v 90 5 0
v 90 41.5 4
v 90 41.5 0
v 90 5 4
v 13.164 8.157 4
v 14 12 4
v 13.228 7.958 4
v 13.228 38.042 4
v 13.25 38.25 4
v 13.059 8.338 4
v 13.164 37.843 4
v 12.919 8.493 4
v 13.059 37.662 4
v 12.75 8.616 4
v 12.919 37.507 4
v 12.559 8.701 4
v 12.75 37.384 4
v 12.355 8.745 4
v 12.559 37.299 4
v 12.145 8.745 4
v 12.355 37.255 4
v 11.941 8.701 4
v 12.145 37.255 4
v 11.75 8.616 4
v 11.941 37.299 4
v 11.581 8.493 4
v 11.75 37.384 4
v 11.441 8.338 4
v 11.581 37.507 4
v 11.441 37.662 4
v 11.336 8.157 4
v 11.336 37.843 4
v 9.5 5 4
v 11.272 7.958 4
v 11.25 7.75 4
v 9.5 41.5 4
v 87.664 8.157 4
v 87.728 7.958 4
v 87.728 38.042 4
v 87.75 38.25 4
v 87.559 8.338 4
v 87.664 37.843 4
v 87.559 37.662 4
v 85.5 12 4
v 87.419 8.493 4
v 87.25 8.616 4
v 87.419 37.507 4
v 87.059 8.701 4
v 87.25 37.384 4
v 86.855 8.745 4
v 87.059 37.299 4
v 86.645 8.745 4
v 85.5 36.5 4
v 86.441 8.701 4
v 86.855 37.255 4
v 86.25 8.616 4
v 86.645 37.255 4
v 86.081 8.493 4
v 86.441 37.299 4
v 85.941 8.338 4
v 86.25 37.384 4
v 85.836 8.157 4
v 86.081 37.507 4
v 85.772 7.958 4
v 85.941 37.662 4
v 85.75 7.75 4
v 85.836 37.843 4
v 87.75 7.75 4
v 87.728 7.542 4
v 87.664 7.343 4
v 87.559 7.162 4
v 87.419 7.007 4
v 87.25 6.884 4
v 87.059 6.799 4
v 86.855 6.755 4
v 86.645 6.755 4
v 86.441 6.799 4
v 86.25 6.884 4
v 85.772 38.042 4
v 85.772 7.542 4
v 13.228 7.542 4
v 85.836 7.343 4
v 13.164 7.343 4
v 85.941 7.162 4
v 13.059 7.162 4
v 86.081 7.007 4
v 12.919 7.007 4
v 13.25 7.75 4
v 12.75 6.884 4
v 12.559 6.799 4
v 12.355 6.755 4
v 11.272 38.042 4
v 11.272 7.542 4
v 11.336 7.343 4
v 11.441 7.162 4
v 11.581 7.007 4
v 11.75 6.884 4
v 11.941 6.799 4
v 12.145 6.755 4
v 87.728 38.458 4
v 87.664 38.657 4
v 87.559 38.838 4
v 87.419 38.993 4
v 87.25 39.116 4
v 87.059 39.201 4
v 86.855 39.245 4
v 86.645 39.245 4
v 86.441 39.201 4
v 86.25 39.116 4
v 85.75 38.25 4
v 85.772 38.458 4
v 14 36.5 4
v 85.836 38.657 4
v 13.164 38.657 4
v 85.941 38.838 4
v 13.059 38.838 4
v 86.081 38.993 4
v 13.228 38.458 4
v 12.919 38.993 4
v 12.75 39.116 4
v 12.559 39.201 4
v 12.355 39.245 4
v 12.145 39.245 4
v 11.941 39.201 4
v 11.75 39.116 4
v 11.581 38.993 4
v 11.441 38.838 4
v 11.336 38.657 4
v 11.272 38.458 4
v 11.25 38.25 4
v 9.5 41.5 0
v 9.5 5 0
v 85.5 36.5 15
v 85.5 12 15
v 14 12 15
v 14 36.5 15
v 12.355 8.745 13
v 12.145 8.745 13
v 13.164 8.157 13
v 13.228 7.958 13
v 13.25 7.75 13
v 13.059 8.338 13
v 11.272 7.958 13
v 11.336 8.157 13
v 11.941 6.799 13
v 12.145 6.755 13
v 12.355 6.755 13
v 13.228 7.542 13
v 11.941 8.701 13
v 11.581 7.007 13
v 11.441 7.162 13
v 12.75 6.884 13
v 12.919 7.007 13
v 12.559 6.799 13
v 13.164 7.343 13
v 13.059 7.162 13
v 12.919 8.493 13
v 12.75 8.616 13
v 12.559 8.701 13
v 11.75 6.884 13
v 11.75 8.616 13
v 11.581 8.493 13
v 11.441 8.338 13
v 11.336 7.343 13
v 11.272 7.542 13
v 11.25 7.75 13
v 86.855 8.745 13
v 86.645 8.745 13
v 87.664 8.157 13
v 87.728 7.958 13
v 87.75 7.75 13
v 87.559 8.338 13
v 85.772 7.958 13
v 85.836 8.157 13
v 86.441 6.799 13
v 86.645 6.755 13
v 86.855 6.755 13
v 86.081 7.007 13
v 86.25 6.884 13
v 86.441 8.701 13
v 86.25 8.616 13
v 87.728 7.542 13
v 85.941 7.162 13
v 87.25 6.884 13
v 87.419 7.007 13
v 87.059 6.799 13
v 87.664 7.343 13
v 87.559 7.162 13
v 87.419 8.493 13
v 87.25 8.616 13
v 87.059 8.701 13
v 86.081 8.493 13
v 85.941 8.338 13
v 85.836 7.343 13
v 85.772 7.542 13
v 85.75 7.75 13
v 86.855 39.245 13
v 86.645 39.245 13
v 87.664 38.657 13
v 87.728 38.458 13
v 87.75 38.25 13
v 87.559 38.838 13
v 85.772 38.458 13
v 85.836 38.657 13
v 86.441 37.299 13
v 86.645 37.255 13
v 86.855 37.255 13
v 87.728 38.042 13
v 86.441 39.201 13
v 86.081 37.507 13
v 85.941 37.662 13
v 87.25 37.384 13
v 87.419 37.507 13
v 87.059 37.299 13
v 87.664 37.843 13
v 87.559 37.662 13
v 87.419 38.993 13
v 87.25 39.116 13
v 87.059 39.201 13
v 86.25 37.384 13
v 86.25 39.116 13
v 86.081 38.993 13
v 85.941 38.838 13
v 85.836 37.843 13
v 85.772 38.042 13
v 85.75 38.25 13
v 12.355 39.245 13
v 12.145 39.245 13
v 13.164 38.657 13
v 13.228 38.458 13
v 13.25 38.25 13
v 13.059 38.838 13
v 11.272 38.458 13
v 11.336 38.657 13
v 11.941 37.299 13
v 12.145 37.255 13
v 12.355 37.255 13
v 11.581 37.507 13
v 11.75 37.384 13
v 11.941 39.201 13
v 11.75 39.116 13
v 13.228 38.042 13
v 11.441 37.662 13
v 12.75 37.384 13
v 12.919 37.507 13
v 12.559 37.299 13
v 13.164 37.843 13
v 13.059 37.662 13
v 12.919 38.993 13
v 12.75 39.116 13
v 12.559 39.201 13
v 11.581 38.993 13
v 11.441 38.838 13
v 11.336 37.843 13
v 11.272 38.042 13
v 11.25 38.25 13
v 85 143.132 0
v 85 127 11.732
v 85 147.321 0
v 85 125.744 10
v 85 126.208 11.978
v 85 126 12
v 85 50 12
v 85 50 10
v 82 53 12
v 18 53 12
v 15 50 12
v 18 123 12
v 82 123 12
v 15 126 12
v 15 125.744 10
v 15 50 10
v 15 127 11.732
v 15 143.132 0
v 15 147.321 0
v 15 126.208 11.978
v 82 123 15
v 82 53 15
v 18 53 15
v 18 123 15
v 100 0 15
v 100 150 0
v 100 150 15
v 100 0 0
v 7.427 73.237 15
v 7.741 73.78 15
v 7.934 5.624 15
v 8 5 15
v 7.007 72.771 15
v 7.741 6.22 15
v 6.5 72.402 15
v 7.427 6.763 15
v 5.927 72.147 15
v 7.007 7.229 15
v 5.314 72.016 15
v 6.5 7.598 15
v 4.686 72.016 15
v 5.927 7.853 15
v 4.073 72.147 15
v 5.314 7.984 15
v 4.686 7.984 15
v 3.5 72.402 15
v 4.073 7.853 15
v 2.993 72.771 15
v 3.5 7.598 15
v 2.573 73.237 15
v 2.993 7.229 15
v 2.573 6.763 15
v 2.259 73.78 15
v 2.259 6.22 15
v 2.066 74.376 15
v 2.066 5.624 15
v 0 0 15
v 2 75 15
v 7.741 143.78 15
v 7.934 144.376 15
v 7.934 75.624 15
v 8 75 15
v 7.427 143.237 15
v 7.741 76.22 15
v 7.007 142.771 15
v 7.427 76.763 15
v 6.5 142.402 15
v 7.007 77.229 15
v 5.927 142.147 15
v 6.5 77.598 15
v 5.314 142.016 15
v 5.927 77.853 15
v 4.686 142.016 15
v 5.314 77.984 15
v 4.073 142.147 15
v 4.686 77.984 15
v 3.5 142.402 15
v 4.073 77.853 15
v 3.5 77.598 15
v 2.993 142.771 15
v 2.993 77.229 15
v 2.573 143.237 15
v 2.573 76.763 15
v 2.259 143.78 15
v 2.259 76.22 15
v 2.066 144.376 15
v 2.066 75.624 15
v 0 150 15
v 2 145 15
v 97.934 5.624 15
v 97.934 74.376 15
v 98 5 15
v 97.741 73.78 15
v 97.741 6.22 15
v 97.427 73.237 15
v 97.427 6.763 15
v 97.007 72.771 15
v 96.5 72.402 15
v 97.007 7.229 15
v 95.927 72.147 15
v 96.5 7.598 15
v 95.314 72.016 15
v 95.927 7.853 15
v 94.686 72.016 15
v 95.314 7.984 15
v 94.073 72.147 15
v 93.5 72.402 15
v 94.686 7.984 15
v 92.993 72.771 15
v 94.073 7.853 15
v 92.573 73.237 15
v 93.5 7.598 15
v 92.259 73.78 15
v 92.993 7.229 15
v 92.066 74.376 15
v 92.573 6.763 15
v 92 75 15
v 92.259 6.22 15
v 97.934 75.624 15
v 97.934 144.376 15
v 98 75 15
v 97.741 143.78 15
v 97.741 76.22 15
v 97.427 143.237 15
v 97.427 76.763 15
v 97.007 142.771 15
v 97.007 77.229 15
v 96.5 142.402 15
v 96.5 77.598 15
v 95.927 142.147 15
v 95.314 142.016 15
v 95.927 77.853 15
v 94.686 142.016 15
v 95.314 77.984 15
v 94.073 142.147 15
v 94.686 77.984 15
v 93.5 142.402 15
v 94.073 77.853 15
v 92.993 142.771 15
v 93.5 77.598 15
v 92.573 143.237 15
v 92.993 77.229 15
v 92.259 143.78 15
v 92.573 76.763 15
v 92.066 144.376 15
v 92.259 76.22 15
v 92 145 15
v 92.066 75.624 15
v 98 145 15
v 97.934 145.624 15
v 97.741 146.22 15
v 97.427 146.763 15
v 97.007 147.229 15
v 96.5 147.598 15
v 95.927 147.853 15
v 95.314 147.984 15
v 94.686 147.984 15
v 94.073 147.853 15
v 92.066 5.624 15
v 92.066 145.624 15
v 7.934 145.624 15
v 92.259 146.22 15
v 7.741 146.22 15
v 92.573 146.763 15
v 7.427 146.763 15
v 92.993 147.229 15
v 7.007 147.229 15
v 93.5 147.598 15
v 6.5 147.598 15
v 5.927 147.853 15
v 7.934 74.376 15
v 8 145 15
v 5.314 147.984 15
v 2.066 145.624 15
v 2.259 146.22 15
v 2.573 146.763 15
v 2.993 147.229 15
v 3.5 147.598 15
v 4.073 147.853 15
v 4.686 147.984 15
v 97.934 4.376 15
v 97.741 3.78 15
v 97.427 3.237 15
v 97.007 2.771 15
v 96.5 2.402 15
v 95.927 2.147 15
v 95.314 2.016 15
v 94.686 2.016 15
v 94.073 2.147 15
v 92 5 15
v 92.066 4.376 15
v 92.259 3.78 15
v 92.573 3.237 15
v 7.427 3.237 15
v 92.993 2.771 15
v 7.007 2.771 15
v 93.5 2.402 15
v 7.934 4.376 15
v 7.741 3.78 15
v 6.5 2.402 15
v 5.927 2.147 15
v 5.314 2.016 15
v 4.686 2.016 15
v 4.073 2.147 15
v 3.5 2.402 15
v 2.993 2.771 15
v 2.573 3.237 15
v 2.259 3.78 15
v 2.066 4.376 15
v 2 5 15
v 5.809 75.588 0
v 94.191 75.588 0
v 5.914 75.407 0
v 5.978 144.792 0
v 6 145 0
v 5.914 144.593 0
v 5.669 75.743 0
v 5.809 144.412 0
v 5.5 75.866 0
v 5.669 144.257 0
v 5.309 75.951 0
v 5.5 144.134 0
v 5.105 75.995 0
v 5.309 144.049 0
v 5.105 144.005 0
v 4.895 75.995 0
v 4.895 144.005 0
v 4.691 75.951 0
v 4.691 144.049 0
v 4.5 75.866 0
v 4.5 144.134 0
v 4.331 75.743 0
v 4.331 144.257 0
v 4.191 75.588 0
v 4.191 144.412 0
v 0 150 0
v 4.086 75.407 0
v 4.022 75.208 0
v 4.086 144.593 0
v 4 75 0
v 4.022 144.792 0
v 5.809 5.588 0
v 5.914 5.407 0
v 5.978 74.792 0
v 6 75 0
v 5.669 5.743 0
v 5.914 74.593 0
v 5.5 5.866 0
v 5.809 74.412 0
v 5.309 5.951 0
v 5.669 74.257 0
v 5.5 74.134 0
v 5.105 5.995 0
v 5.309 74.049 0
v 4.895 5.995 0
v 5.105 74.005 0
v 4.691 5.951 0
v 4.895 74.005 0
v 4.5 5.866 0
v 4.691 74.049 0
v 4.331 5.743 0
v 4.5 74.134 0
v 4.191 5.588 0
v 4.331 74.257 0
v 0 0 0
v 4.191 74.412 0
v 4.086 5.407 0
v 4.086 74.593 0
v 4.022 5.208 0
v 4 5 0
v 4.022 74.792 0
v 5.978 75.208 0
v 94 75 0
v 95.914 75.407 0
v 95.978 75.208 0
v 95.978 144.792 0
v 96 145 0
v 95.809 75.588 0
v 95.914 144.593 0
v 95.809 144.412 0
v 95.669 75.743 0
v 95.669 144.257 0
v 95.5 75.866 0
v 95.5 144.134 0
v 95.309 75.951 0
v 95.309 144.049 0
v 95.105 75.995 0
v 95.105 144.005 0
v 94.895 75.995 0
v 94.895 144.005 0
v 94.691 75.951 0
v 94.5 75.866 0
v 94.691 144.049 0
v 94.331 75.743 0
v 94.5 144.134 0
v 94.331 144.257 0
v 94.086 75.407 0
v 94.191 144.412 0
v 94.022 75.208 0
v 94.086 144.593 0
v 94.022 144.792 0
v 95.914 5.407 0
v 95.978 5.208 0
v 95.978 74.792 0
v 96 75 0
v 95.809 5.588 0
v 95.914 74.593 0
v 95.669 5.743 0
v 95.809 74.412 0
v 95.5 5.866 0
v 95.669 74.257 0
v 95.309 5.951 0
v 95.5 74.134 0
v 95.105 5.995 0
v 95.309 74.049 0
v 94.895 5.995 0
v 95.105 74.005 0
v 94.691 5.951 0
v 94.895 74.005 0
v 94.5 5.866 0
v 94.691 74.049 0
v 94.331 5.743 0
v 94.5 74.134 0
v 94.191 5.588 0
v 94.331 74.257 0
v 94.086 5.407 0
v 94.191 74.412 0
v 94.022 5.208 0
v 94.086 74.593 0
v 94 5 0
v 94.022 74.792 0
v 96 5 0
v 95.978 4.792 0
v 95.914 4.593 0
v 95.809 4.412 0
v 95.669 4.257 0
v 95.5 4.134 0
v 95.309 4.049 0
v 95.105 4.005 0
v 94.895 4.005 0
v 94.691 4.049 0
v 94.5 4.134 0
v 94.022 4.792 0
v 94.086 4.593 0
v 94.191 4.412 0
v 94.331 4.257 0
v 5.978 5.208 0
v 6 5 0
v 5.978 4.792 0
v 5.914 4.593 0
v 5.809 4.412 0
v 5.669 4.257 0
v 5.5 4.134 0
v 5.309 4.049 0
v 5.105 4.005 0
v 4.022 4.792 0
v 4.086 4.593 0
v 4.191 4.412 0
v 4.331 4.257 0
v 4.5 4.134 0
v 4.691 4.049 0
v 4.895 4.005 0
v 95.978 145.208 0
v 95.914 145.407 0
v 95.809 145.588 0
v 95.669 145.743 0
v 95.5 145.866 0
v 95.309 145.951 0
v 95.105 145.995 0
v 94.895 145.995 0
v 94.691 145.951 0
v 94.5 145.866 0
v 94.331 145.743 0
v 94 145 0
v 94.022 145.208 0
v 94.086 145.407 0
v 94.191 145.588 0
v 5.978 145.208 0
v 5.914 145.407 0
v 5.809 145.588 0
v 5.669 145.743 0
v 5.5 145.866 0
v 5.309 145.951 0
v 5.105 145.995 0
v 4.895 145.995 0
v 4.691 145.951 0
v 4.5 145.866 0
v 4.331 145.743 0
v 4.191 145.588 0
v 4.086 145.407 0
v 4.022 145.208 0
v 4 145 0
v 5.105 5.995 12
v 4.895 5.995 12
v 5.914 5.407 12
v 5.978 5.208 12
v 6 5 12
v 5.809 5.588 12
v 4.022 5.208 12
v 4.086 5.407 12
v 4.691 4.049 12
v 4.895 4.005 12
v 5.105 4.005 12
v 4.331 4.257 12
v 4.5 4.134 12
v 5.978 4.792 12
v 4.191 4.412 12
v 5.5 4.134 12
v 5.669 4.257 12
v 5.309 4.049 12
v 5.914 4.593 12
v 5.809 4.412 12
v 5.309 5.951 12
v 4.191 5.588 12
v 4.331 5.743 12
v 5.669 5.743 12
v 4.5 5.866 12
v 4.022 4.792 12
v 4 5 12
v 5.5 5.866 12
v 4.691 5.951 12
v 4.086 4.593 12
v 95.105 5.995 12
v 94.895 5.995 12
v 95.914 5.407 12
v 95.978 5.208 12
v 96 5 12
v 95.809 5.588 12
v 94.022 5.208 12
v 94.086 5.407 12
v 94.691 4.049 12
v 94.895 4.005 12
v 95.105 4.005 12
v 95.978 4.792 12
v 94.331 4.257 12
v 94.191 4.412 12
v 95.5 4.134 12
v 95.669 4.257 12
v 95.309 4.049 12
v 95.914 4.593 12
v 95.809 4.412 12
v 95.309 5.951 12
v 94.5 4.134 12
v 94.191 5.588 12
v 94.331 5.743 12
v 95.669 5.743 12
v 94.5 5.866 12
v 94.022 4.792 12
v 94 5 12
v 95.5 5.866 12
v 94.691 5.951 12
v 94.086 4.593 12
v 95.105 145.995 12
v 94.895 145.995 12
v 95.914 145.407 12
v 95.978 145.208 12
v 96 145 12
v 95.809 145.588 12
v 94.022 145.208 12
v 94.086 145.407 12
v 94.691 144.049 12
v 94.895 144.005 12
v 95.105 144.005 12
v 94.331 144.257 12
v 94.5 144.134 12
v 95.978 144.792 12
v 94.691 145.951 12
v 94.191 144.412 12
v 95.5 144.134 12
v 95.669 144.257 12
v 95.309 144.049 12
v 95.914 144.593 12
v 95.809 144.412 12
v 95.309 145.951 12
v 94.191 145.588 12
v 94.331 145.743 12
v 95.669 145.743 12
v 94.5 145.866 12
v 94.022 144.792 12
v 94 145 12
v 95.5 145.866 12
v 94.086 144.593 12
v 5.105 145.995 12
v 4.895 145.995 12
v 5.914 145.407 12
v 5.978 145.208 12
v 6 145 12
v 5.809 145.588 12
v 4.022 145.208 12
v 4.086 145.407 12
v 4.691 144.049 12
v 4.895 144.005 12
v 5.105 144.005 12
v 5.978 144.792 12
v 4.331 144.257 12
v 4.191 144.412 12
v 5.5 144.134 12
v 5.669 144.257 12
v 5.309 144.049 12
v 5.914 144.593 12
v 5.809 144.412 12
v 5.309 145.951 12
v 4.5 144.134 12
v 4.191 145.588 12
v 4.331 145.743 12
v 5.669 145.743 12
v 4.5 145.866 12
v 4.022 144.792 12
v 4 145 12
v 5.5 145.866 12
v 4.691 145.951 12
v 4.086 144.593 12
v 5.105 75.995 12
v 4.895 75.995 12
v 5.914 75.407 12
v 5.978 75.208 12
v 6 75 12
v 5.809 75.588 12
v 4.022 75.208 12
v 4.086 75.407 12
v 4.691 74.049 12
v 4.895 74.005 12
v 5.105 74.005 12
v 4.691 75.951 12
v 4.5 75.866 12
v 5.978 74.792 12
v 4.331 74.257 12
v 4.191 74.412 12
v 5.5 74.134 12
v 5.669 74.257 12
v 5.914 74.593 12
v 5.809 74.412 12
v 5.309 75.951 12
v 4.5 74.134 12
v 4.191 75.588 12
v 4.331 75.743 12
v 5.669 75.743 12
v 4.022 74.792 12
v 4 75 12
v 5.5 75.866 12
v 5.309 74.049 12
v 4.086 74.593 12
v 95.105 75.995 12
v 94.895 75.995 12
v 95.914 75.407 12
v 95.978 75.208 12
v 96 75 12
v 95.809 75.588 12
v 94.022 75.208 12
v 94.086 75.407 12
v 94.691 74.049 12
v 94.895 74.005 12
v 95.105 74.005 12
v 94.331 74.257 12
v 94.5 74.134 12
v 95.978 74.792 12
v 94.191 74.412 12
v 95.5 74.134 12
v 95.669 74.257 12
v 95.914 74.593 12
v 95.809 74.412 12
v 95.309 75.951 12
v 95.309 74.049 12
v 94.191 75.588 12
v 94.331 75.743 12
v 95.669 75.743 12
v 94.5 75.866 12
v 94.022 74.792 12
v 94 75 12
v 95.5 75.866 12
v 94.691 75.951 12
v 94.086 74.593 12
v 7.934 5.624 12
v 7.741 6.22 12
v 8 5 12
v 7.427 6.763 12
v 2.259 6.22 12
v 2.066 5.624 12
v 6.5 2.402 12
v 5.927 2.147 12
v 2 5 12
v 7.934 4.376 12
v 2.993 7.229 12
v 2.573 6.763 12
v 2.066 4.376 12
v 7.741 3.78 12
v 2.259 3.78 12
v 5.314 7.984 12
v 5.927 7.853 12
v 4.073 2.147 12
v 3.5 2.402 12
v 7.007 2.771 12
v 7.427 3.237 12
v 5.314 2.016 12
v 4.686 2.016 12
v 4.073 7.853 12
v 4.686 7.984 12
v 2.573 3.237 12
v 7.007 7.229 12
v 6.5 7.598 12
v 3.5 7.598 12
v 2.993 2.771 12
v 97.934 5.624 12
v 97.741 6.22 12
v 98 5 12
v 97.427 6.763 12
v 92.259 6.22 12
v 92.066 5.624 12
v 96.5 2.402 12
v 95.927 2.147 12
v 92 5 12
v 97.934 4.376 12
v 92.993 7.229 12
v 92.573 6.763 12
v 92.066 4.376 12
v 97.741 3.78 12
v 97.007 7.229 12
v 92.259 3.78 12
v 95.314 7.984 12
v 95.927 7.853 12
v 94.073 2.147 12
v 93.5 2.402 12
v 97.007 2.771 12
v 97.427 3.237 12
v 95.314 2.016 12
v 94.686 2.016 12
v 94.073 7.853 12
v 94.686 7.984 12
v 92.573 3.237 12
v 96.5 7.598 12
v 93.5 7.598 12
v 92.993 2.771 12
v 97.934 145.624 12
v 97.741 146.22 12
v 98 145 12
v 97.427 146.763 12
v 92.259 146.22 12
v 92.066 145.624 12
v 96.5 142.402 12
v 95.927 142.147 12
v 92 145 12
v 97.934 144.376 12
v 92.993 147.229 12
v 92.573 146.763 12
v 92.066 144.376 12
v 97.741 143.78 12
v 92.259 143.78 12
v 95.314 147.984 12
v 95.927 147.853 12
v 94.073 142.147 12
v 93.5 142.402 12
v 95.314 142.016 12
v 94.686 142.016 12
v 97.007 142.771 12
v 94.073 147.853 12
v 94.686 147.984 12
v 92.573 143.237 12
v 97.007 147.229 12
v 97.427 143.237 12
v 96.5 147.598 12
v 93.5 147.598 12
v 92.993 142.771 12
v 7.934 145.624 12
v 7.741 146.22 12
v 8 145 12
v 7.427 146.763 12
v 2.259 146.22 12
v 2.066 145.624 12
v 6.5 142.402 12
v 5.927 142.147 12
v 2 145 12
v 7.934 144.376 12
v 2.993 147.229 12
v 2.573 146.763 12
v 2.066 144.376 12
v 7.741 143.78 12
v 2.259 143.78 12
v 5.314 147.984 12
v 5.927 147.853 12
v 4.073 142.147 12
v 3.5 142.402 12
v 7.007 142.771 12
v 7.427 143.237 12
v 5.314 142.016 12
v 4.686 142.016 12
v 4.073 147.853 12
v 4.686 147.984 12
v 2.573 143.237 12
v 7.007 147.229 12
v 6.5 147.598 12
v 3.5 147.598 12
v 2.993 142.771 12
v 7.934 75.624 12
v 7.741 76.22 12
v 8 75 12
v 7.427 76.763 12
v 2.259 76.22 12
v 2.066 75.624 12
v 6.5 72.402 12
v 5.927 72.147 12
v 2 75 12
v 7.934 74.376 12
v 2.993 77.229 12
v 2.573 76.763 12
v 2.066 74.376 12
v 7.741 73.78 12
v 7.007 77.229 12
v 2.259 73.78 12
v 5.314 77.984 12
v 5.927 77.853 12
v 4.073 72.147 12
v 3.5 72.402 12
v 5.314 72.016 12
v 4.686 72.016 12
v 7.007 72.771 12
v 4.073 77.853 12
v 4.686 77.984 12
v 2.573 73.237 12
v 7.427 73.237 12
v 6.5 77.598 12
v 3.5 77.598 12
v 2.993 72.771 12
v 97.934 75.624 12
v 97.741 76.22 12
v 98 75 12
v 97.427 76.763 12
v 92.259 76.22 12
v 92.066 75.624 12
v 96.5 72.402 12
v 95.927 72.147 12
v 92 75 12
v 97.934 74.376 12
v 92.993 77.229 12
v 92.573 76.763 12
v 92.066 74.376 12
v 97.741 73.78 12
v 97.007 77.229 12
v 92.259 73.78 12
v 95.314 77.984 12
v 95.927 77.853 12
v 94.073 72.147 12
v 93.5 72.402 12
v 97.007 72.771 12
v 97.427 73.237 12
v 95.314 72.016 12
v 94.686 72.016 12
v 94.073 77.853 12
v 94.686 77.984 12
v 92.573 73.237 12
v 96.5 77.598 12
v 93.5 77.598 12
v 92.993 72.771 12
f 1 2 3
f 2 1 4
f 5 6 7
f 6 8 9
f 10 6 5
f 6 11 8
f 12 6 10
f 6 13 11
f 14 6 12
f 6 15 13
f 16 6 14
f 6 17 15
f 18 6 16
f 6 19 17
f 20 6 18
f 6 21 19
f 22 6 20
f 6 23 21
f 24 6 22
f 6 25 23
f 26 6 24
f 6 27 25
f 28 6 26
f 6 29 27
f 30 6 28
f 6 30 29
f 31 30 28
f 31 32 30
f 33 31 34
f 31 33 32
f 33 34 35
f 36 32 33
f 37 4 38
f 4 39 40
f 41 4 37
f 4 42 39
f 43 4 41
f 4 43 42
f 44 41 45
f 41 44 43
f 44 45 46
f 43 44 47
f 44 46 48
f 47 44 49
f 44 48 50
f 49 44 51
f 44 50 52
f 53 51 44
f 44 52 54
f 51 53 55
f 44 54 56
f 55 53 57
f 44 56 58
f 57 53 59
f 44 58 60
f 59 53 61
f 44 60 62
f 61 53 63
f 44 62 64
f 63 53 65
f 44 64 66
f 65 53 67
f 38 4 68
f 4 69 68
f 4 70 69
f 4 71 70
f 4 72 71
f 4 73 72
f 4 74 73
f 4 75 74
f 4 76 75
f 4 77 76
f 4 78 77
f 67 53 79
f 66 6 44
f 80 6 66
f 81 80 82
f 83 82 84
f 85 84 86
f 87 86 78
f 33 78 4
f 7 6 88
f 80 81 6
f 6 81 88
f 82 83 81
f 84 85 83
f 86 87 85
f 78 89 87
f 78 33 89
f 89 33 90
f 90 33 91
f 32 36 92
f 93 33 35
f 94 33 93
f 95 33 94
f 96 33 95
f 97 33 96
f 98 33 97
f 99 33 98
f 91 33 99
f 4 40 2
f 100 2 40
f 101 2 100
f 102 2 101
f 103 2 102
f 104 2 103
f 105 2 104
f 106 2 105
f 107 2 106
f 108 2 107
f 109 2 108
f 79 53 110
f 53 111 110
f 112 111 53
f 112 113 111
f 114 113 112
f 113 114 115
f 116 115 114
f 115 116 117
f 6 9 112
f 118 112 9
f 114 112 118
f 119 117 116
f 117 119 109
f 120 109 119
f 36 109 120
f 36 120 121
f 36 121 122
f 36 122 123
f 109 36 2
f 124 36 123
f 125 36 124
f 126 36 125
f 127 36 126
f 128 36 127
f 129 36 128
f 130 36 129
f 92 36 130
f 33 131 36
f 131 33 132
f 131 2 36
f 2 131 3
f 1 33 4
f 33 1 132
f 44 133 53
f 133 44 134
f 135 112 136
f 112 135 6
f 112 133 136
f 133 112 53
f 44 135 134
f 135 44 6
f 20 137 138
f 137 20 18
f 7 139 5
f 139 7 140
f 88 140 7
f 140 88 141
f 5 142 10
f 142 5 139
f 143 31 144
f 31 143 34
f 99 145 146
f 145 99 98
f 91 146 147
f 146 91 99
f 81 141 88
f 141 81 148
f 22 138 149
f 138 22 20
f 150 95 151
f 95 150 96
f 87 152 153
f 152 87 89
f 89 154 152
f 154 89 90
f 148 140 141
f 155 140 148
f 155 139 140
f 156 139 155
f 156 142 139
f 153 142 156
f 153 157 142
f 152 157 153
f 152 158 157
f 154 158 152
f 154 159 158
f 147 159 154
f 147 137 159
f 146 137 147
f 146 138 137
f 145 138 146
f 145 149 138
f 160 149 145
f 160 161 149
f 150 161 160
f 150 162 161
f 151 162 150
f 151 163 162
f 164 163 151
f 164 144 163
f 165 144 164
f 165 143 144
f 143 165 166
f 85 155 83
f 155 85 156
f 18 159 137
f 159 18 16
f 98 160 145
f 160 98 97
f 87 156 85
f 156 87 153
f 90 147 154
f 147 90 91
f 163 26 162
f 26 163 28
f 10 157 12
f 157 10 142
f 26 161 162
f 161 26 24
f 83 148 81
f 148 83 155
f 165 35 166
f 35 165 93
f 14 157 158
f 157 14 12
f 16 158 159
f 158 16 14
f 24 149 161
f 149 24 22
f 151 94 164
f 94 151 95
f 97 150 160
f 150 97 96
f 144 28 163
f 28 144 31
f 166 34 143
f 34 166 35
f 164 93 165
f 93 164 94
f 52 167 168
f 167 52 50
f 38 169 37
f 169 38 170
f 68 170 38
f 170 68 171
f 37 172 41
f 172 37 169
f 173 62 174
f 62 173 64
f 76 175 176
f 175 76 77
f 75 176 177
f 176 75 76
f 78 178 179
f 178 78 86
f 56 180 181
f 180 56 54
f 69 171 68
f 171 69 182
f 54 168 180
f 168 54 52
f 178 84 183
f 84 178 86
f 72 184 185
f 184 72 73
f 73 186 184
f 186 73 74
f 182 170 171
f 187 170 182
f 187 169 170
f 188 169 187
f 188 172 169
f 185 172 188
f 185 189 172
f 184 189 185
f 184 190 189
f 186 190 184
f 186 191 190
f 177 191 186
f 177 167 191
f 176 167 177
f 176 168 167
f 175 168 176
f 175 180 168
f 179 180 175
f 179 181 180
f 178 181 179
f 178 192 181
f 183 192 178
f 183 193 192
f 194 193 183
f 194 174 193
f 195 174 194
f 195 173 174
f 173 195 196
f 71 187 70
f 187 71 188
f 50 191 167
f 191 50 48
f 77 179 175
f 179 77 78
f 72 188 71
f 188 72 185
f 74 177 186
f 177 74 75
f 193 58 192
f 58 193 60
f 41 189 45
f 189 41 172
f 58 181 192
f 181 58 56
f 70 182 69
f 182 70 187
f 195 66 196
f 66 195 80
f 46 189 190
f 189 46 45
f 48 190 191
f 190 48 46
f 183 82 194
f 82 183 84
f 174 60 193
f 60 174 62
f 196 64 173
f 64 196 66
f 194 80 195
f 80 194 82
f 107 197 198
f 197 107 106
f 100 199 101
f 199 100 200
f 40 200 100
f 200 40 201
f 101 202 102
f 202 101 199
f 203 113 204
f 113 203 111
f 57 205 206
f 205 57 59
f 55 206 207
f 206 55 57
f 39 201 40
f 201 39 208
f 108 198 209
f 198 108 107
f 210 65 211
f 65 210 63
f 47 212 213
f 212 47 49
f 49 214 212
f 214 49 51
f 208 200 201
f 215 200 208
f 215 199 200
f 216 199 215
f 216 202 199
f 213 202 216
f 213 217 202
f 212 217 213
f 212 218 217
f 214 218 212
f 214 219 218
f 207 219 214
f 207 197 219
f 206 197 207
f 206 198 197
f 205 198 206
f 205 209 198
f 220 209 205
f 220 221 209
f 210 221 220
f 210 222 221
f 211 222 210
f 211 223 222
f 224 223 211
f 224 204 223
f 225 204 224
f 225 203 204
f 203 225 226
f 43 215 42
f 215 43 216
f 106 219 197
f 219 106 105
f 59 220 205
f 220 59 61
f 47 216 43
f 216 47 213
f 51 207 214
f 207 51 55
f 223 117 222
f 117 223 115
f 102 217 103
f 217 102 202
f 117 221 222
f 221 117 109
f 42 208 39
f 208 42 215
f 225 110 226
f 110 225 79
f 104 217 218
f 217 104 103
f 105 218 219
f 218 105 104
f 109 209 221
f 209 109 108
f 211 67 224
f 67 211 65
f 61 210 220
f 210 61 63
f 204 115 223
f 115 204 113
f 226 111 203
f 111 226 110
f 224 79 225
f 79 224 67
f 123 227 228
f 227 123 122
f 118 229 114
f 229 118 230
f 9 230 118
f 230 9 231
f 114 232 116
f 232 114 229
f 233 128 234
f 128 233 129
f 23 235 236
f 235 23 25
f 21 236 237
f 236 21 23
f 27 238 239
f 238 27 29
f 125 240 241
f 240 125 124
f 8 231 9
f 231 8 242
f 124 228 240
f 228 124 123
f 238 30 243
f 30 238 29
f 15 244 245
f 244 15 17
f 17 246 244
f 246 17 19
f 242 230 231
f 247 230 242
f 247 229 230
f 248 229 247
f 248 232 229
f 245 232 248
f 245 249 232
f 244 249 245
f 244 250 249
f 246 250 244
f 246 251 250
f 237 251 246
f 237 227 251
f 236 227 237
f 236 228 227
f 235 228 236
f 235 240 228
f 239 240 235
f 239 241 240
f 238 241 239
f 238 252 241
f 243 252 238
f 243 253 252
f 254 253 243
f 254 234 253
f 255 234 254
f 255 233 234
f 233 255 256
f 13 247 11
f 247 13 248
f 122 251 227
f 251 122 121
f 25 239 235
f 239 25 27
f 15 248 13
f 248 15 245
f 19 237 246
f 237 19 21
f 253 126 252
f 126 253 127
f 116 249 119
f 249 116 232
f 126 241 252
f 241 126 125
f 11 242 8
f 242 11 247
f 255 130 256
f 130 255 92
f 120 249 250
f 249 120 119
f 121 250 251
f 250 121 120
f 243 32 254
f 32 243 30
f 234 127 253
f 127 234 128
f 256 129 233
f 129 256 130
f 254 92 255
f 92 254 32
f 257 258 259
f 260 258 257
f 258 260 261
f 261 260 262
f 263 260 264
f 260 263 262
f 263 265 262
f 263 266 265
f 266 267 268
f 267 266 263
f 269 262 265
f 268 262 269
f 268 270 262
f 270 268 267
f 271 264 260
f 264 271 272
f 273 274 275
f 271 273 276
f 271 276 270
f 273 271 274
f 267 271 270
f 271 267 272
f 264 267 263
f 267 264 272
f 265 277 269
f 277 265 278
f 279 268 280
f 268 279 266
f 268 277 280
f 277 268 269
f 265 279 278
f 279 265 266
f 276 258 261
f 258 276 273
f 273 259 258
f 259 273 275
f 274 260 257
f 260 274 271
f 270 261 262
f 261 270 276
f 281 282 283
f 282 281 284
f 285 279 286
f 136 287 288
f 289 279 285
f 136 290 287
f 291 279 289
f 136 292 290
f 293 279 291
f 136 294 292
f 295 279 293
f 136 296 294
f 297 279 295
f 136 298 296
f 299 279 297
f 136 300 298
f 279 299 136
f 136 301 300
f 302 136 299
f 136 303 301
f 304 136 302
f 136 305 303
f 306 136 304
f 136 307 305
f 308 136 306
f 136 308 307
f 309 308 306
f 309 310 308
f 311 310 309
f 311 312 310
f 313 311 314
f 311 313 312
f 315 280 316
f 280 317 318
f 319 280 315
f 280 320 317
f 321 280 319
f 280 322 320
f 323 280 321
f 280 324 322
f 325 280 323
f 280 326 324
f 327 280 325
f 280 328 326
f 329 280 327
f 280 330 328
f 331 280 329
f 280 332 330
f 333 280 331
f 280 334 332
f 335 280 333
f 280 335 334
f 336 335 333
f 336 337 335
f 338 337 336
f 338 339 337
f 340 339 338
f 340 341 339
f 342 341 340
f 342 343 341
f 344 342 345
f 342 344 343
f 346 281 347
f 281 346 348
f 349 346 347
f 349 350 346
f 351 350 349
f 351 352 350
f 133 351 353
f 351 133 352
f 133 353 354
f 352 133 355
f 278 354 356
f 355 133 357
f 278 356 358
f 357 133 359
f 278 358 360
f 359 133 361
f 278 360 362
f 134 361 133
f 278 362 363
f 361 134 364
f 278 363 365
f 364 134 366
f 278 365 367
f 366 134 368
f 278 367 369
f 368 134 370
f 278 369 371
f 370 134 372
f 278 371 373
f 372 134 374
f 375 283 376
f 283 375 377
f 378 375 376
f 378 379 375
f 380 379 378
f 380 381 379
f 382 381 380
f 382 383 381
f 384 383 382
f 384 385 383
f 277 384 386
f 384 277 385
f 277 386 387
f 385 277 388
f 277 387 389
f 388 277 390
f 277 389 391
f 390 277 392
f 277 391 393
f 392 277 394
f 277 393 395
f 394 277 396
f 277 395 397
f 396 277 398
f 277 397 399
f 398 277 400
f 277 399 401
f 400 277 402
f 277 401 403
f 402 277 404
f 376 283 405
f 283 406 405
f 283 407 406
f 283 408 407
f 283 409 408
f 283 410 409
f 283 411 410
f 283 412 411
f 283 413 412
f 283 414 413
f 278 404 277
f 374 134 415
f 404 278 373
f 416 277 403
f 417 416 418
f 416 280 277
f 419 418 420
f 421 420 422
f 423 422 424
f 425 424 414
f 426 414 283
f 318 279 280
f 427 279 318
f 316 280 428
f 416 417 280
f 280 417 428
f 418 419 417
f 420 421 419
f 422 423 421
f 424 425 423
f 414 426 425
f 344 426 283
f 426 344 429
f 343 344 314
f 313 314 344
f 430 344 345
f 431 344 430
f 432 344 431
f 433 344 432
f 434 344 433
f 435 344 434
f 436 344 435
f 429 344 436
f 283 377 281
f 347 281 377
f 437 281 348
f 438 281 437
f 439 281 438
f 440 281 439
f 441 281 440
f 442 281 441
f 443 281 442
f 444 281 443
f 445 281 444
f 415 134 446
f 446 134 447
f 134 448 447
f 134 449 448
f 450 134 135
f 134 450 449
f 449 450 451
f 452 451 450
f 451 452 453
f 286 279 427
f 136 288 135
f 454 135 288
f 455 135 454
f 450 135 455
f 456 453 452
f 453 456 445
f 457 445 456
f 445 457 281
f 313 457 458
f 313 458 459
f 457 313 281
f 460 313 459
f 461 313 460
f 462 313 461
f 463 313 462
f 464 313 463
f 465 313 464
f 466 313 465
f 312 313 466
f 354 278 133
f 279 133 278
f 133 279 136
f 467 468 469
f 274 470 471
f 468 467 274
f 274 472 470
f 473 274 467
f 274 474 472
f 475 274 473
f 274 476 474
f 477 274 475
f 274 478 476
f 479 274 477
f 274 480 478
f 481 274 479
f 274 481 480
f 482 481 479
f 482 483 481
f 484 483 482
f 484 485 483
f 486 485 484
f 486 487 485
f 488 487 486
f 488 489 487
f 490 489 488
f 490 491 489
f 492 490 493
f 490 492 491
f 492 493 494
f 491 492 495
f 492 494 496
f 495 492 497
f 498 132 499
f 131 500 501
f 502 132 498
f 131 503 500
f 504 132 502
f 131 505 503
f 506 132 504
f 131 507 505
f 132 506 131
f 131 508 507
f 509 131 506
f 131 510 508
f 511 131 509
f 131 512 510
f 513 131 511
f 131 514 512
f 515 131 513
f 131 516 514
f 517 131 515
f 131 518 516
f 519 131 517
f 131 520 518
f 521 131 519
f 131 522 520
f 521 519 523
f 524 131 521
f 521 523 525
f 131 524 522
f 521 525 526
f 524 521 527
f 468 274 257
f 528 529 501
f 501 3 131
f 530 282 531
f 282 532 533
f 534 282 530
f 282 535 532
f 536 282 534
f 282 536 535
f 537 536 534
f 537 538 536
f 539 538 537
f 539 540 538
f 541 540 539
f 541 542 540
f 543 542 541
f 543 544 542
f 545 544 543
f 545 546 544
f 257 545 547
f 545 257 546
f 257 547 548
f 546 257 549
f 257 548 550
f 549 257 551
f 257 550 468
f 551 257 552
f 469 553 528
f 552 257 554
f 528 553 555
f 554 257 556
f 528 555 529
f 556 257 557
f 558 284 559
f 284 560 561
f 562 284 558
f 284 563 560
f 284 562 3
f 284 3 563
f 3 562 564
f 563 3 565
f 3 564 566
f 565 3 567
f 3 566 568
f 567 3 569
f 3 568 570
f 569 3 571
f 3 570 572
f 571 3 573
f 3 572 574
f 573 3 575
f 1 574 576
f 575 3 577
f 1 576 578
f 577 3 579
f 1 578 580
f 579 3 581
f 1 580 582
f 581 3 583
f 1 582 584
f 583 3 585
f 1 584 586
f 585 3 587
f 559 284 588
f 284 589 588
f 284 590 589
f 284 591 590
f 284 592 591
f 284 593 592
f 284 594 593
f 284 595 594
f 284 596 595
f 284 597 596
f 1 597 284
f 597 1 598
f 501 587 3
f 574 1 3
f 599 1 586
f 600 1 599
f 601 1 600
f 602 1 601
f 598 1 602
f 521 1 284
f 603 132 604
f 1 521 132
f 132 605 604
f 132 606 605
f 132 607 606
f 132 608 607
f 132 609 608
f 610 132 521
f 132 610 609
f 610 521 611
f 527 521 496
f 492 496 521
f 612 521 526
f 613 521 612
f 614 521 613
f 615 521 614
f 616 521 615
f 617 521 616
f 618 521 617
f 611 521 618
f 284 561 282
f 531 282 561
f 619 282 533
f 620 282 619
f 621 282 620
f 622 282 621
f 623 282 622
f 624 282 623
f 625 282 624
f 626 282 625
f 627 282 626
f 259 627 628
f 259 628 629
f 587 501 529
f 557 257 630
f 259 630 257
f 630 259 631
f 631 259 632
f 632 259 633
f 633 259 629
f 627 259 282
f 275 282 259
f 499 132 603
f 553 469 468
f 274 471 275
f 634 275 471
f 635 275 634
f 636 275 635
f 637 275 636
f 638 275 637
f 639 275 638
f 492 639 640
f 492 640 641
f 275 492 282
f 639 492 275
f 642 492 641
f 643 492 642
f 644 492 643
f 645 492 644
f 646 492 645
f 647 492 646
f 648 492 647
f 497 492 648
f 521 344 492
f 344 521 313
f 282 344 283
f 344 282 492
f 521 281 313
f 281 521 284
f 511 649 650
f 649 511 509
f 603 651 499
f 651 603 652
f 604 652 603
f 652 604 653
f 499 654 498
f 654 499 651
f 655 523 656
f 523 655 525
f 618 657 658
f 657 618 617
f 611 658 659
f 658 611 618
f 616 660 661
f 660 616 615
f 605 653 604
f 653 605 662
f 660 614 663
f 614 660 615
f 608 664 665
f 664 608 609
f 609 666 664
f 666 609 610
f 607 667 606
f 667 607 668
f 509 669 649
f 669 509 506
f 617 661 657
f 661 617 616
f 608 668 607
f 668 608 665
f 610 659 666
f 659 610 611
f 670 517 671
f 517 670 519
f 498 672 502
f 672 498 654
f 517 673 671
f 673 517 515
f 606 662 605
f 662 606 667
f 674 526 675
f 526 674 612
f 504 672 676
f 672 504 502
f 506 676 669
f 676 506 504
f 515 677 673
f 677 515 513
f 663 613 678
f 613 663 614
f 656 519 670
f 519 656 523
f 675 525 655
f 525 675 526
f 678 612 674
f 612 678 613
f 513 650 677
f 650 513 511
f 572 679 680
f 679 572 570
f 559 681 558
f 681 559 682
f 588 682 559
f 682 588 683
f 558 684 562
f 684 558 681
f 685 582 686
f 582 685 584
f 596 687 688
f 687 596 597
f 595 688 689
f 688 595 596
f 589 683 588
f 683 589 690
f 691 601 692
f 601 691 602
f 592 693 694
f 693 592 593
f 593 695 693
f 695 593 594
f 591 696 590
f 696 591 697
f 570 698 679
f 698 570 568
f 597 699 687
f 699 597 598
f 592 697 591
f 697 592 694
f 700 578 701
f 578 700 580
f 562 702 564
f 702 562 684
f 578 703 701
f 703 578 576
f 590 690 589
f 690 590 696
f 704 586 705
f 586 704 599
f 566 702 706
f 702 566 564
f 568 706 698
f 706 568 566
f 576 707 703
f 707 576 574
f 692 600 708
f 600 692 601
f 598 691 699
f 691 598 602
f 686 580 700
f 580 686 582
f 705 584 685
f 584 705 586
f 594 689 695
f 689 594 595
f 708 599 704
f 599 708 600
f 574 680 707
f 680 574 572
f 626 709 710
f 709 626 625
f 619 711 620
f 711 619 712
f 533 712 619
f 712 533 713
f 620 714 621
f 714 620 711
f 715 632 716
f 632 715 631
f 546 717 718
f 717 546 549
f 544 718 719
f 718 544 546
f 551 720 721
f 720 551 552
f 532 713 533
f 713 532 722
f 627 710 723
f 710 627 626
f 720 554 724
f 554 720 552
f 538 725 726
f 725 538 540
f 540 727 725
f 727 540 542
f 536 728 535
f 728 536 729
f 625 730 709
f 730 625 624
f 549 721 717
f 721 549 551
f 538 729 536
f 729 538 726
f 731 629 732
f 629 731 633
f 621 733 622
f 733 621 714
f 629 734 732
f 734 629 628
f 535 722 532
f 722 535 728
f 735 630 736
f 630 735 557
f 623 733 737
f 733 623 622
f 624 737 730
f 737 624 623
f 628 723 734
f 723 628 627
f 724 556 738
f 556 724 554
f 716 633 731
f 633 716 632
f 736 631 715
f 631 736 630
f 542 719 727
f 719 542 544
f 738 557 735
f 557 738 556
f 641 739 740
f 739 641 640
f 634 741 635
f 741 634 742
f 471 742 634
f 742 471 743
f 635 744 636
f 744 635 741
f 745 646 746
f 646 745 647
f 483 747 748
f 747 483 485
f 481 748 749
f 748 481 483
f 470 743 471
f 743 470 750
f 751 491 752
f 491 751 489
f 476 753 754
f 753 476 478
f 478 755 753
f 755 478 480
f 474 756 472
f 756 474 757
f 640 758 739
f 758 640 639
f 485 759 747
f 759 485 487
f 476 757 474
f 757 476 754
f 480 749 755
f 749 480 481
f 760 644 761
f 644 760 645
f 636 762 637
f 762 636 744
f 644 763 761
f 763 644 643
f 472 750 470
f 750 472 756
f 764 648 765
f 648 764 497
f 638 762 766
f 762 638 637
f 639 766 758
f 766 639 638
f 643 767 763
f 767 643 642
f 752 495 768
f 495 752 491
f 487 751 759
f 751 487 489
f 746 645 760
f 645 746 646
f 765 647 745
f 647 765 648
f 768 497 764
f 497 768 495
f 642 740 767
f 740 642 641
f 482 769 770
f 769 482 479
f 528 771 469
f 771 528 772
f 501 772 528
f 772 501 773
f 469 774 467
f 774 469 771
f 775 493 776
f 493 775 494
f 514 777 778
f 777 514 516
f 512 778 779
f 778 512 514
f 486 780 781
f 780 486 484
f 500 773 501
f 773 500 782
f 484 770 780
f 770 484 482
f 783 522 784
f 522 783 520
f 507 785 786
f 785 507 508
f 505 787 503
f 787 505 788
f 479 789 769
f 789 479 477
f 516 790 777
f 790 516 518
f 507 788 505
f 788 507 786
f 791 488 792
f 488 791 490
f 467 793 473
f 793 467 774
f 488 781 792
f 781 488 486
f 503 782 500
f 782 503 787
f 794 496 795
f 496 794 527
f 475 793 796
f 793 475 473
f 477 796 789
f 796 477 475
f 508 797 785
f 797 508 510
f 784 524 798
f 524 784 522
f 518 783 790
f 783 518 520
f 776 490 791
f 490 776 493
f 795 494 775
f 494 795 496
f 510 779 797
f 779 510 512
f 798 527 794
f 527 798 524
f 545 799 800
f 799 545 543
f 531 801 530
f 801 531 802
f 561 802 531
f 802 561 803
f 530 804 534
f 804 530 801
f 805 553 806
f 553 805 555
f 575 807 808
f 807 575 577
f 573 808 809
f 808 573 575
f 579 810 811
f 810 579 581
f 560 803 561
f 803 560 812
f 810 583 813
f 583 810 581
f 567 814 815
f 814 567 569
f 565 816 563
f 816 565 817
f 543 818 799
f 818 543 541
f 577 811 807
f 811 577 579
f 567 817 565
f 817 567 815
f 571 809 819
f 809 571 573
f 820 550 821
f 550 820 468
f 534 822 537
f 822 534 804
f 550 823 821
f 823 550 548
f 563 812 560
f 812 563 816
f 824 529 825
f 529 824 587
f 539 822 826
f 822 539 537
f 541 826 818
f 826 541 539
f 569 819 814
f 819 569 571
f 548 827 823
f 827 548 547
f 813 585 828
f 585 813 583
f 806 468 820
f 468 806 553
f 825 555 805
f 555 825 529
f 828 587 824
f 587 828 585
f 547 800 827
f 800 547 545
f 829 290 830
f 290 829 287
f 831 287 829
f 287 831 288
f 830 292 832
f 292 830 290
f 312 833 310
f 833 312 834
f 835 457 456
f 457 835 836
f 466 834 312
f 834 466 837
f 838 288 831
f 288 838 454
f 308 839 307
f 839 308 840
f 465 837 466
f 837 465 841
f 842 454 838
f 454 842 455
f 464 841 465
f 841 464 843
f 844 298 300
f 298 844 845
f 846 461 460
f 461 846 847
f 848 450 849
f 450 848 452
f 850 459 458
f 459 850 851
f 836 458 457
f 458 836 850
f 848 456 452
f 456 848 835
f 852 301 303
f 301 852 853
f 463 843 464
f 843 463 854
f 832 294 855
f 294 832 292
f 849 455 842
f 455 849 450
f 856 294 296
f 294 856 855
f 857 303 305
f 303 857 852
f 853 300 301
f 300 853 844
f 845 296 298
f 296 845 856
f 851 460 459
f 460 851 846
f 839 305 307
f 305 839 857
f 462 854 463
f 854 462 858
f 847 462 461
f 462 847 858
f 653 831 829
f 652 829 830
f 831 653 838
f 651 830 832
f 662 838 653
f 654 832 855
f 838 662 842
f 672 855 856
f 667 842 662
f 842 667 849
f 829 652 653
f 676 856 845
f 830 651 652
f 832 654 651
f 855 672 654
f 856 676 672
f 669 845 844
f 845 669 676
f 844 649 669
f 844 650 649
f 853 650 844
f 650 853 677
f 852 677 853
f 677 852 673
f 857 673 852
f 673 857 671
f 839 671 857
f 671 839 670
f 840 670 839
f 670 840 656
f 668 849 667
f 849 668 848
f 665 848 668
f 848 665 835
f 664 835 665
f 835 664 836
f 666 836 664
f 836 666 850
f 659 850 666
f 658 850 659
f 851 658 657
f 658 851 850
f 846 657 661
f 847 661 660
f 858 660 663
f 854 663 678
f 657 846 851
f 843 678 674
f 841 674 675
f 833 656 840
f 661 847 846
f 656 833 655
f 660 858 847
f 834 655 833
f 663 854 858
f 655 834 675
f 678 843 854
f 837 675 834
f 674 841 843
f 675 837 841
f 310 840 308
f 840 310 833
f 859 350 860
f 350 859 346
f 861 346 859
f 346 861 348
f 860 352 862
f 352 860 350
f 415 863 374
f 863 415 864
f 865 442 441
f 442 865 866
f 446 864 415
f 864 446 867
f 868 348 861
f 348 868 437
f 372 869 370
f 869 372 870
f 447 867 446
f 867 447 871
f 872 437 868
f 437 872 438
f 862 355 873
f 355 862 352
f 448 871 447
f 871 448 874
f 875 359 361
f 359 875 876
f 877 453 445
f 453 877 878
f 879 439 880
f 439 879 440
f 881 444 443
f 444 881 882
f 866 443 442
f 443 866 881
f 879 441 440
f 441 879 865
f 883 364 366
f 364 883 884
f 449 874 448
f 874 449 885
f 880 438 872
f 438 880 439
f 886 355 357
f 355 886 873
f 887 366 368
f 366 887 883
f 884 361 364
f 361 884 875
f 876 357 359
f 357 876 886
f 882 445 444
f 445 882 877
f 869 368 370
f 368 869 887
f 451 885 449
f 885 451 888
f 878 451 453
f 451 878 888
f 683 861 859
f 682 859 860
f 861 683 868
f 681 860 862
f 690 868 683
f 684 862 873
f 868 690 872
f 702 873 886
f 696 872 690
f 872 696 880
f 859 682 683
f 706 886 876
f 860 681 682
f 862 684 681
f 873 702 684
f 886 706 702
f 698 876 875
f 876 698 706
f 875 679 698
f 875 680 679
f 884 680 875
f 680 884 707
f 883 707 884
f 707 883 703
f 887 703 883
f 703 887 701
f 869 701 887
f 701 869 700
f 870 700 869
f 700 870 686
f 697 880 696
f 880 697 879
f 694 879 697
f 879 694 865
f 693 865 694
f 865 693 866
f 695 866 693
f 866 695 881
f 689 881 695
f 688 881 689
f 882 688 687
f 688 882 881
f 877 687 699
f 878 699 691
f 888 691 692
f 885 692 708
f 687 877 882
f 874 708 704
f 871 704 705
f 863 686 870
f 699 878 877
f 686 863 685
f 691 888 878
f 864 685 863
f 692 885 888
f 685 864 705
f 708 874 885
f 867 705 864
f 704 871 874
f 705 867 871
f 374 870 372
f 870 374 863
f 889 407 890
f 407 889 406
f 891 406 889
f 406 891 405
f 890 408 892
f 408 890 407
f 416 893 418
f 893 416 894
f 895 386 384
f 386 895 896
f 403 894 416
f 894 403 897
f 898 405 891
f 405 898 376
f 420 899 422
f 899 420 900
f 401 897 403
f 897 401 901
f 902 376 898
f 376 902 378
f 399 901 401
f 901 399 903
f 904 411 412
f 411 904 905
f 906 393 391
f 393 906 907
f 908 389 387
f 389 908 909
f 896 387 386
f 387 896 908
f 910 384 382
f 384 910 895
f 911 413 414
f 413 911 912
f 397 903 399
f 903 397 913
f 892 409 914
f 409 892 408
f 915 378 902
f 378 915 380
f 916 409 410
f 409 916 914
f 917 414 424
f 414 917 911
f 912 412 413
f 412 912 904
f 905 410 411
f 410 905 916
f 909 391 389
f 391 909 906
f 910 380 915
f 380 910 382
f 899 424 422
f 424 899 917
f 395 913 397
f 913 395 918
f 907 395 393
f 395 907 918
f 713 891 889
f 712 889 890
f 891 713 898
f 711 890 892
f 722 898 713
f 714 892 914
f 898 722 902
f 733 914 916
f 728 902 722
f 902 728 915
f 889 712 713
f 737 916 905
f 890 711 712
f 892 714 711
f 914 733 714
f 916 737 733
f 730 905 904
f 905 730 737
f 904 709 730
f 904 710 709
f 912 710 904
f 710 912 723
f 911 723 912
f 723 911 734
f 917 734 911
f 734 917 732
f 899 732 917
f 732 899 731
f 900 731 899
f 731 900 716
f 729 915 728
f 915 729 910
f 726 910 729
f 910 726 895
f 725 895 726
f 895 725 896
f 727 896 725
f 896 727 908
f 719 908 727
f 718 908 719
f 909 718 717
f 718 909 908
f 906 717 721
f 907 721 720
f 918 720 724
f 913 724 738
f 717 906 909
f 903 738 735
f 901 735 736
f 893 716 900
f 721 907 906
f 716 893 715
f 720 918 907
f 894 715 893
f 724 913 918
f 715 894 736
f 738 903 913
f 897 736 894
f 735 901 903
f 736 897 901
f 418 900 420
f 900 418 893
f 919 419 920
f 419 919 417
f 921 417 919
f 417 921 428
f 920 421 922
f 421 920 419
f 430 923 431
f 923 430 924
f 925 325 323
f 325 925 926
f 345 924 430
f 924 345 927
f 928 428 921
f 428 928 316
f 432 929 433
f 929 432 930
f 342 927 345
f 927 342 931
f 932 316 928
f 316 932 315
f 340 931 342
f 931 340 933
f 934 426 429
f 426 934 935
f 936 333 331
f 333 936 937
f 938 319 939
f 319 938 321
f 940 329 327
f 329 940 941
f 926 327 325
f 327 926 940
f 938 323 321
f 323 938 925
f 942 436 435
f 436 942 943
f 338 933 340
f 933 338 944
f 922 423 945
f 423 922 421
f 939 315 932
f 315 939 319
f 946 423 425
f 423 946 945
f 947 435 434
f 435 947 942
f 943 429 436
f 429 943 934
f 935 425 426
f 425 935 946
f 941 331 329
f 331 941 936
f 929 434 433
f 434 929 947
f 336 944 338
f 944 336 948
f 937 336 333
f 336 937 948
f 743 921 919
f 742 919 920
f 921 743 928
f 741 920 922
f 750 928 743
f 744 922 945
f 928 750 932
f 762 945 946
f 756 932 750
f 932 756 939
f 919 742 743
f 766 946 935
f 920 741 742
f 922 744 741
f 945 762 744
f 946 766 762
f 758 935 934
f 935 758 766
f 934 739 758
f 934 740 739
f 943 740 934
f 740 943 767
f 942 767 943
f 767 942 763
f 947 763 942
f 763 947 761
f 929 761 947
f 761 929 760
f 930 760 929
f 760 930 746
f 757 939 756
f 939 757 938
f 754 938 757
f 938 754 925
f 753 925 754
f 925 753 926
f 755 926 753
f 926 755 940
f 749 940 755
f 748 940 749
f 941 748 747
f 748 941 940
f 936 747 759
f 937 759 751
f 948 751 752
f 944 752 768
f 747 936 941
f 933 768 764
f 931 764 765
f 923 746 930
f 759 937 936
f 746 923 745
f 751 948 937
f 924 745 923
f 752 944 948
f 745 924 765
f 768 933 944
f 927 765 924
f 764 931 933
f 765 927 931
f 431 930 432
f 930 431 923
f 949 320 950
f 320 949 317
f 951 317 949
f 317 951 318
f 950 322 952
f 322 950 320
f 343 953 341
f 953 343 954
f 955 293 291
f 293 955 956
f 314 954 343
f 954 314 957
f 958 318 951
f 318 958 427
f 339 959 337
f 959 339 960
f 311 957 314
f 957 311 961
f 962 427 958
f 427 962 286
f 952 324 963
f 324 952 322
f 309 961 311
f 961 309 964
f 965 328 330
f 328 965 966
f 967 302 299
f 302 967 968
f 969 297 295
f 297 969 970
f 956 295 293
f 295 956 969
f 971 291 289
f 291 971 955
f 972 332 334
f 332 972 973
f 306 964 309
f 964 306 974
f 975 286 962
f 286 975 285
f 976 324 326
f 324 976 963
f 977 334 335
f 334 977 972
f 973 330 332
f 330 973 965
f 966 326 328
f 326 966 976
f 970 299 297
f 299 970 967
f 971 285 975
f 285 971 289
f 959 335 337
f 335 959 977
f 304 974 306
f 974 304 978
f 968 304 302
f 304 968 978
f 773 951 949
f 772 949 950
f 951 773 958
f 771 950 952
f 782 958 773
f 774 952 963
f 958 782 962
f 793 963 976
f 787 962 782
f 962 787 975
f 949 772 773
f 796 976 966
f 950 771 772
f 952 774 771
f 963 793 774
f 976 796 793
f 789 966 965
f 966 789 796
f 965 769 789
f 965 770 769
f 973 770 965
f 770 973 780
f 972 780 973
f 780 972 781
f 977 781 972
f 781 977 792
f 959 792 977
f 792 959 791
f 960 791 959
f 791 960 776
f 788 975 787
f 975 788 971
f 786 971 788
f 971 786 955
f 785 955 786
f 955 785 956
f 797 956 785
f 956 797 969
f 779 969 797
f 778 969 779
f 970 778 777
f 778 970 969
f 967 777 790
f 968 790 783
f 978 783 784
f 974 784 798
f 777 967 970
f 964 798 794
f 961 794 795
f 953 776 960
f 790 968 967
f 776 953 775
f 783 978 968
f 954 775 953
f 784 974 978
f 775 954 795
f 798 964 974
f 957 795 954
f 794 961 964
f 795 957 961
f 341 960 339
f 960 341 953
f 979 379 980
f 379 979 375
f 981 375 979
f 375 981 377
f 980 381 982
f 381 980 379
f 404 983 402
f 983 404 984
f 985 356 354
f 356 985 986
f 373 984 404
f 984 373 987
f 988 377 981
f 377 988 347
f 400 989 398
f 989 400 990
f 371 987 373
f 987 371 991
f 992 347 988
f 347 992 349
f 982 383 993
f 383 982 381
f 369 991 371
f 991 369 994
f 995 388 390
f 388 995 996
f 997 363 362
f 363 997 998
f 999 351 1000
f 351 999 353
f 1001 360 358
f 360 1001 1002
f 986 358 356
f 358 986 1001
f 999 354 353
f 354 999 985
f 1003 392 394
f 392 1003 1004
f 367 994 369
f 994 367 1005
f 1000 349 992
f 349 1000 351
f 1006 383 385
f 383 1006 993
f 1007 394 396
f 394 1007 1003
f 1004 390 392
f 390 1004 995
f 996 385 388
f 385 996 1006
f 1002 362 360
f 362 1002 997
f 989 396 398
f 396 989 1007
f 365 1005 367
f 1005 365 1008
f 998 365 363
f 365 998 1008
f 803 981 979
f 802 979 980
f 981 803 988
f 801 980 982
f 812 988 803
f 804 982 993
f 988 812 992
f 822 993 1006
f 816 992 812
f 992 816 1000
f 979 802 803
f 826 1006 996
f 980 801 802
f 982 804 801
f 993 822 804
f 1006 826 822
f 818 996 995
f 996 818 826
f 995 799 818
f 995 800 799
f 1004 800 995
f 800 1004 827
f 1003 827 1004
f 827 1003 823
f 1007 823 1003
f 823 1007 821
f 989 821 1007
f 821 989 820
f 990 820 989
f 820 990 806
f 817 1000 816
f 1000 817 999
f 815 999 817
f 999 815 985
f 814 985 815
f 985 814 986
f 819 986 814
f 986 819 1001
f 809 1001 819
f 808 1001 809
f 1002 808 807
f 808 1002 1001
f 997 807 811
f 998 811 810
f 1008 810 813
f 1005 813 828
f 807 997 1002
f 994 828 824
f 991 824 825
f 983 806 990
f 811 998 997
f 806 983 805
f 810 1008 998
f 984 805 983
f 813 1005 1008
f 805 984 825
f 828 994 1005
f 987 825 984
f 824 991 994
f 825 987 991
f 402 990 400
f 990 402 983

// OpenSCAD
largeur_board=36;
longueur_board=80;
largeur_ecran=24;
longueur_ecran=71;
tolerance=0.5;
thickness=15;

keyboardx=70;
keyboardy=76;
windowKeyX=64;
windowKeyY=70;

//min 11mm 
$fn=30;

module keyboardHole(){
    translate([15,50,10]) cube([keyboardx,keyboardy,2]);
    translate([18,53,11]) cube([windowKeyX,windowKeyY,10]);
    hull(){
        translate([15,126,10]) rotate([-30,0,0]) 
            cube([keyboardx,keyboardy,2]);
        translate([15,126,11]) rotate([0,90,0]) cylinder(r=1,h=keyboardx);
    }
}
module screenHole(){
        cube([longueur_board+tolerance,largeur_board+tolerance,5]);
    translate([4.5,7,2]) 
        cube([longueur_ecran+tolerance,largeur_ecran+tolerance,thickness]);
    screw_offset= 0.75+1.5+tolerance;
    translate([screw_offset,screw_offset,0]) 
        cylinder(r=1,h=14);
    translate([longueur_board-screw_offset,screw_offset,0]) 
        cylinder(r=1,h=14);
    translate([longueur_board-screw_offset,largeur_board-screw_offset,0]) 
        cylinder(r=1,h=14);
    translate([screw_offset,largeur_board-screw_offset,0]) 
        cylinder(r=1,h=14);
}
difference(){
    cube([100,150,thickness]);
    translate([9.5,5,-1]) screenHole();
    keyboardHole();

    translate([5,5,-1]) cylinder(r=1,h=17);
    translate([95,5,-1]) cylinder(r=1,h=17);
    translate([95,145,-1]) cylinder(r=1,h=17);
    translate([5,145,-1]) cylinder(r=1,h=17);
    translate([5,75,-1]) cylinder(r=1,h=17);
    translate([95,75,-1]) cylinder(r=1,h=17);

    translate([5,5,12]) cylinder(r=3,h=17);
    translate([95,5,12]) cylinder(r=3,h=17);
    translate([95,145,12]) cylinder(r=3,h=17);
    translate([5,145,12]) cylinder(r=3,h=17);
    translate([5,75,12]) cylinder(r=3,h=17);
    translate([95,75,12]) cylinder(r=3,h=17);
}
